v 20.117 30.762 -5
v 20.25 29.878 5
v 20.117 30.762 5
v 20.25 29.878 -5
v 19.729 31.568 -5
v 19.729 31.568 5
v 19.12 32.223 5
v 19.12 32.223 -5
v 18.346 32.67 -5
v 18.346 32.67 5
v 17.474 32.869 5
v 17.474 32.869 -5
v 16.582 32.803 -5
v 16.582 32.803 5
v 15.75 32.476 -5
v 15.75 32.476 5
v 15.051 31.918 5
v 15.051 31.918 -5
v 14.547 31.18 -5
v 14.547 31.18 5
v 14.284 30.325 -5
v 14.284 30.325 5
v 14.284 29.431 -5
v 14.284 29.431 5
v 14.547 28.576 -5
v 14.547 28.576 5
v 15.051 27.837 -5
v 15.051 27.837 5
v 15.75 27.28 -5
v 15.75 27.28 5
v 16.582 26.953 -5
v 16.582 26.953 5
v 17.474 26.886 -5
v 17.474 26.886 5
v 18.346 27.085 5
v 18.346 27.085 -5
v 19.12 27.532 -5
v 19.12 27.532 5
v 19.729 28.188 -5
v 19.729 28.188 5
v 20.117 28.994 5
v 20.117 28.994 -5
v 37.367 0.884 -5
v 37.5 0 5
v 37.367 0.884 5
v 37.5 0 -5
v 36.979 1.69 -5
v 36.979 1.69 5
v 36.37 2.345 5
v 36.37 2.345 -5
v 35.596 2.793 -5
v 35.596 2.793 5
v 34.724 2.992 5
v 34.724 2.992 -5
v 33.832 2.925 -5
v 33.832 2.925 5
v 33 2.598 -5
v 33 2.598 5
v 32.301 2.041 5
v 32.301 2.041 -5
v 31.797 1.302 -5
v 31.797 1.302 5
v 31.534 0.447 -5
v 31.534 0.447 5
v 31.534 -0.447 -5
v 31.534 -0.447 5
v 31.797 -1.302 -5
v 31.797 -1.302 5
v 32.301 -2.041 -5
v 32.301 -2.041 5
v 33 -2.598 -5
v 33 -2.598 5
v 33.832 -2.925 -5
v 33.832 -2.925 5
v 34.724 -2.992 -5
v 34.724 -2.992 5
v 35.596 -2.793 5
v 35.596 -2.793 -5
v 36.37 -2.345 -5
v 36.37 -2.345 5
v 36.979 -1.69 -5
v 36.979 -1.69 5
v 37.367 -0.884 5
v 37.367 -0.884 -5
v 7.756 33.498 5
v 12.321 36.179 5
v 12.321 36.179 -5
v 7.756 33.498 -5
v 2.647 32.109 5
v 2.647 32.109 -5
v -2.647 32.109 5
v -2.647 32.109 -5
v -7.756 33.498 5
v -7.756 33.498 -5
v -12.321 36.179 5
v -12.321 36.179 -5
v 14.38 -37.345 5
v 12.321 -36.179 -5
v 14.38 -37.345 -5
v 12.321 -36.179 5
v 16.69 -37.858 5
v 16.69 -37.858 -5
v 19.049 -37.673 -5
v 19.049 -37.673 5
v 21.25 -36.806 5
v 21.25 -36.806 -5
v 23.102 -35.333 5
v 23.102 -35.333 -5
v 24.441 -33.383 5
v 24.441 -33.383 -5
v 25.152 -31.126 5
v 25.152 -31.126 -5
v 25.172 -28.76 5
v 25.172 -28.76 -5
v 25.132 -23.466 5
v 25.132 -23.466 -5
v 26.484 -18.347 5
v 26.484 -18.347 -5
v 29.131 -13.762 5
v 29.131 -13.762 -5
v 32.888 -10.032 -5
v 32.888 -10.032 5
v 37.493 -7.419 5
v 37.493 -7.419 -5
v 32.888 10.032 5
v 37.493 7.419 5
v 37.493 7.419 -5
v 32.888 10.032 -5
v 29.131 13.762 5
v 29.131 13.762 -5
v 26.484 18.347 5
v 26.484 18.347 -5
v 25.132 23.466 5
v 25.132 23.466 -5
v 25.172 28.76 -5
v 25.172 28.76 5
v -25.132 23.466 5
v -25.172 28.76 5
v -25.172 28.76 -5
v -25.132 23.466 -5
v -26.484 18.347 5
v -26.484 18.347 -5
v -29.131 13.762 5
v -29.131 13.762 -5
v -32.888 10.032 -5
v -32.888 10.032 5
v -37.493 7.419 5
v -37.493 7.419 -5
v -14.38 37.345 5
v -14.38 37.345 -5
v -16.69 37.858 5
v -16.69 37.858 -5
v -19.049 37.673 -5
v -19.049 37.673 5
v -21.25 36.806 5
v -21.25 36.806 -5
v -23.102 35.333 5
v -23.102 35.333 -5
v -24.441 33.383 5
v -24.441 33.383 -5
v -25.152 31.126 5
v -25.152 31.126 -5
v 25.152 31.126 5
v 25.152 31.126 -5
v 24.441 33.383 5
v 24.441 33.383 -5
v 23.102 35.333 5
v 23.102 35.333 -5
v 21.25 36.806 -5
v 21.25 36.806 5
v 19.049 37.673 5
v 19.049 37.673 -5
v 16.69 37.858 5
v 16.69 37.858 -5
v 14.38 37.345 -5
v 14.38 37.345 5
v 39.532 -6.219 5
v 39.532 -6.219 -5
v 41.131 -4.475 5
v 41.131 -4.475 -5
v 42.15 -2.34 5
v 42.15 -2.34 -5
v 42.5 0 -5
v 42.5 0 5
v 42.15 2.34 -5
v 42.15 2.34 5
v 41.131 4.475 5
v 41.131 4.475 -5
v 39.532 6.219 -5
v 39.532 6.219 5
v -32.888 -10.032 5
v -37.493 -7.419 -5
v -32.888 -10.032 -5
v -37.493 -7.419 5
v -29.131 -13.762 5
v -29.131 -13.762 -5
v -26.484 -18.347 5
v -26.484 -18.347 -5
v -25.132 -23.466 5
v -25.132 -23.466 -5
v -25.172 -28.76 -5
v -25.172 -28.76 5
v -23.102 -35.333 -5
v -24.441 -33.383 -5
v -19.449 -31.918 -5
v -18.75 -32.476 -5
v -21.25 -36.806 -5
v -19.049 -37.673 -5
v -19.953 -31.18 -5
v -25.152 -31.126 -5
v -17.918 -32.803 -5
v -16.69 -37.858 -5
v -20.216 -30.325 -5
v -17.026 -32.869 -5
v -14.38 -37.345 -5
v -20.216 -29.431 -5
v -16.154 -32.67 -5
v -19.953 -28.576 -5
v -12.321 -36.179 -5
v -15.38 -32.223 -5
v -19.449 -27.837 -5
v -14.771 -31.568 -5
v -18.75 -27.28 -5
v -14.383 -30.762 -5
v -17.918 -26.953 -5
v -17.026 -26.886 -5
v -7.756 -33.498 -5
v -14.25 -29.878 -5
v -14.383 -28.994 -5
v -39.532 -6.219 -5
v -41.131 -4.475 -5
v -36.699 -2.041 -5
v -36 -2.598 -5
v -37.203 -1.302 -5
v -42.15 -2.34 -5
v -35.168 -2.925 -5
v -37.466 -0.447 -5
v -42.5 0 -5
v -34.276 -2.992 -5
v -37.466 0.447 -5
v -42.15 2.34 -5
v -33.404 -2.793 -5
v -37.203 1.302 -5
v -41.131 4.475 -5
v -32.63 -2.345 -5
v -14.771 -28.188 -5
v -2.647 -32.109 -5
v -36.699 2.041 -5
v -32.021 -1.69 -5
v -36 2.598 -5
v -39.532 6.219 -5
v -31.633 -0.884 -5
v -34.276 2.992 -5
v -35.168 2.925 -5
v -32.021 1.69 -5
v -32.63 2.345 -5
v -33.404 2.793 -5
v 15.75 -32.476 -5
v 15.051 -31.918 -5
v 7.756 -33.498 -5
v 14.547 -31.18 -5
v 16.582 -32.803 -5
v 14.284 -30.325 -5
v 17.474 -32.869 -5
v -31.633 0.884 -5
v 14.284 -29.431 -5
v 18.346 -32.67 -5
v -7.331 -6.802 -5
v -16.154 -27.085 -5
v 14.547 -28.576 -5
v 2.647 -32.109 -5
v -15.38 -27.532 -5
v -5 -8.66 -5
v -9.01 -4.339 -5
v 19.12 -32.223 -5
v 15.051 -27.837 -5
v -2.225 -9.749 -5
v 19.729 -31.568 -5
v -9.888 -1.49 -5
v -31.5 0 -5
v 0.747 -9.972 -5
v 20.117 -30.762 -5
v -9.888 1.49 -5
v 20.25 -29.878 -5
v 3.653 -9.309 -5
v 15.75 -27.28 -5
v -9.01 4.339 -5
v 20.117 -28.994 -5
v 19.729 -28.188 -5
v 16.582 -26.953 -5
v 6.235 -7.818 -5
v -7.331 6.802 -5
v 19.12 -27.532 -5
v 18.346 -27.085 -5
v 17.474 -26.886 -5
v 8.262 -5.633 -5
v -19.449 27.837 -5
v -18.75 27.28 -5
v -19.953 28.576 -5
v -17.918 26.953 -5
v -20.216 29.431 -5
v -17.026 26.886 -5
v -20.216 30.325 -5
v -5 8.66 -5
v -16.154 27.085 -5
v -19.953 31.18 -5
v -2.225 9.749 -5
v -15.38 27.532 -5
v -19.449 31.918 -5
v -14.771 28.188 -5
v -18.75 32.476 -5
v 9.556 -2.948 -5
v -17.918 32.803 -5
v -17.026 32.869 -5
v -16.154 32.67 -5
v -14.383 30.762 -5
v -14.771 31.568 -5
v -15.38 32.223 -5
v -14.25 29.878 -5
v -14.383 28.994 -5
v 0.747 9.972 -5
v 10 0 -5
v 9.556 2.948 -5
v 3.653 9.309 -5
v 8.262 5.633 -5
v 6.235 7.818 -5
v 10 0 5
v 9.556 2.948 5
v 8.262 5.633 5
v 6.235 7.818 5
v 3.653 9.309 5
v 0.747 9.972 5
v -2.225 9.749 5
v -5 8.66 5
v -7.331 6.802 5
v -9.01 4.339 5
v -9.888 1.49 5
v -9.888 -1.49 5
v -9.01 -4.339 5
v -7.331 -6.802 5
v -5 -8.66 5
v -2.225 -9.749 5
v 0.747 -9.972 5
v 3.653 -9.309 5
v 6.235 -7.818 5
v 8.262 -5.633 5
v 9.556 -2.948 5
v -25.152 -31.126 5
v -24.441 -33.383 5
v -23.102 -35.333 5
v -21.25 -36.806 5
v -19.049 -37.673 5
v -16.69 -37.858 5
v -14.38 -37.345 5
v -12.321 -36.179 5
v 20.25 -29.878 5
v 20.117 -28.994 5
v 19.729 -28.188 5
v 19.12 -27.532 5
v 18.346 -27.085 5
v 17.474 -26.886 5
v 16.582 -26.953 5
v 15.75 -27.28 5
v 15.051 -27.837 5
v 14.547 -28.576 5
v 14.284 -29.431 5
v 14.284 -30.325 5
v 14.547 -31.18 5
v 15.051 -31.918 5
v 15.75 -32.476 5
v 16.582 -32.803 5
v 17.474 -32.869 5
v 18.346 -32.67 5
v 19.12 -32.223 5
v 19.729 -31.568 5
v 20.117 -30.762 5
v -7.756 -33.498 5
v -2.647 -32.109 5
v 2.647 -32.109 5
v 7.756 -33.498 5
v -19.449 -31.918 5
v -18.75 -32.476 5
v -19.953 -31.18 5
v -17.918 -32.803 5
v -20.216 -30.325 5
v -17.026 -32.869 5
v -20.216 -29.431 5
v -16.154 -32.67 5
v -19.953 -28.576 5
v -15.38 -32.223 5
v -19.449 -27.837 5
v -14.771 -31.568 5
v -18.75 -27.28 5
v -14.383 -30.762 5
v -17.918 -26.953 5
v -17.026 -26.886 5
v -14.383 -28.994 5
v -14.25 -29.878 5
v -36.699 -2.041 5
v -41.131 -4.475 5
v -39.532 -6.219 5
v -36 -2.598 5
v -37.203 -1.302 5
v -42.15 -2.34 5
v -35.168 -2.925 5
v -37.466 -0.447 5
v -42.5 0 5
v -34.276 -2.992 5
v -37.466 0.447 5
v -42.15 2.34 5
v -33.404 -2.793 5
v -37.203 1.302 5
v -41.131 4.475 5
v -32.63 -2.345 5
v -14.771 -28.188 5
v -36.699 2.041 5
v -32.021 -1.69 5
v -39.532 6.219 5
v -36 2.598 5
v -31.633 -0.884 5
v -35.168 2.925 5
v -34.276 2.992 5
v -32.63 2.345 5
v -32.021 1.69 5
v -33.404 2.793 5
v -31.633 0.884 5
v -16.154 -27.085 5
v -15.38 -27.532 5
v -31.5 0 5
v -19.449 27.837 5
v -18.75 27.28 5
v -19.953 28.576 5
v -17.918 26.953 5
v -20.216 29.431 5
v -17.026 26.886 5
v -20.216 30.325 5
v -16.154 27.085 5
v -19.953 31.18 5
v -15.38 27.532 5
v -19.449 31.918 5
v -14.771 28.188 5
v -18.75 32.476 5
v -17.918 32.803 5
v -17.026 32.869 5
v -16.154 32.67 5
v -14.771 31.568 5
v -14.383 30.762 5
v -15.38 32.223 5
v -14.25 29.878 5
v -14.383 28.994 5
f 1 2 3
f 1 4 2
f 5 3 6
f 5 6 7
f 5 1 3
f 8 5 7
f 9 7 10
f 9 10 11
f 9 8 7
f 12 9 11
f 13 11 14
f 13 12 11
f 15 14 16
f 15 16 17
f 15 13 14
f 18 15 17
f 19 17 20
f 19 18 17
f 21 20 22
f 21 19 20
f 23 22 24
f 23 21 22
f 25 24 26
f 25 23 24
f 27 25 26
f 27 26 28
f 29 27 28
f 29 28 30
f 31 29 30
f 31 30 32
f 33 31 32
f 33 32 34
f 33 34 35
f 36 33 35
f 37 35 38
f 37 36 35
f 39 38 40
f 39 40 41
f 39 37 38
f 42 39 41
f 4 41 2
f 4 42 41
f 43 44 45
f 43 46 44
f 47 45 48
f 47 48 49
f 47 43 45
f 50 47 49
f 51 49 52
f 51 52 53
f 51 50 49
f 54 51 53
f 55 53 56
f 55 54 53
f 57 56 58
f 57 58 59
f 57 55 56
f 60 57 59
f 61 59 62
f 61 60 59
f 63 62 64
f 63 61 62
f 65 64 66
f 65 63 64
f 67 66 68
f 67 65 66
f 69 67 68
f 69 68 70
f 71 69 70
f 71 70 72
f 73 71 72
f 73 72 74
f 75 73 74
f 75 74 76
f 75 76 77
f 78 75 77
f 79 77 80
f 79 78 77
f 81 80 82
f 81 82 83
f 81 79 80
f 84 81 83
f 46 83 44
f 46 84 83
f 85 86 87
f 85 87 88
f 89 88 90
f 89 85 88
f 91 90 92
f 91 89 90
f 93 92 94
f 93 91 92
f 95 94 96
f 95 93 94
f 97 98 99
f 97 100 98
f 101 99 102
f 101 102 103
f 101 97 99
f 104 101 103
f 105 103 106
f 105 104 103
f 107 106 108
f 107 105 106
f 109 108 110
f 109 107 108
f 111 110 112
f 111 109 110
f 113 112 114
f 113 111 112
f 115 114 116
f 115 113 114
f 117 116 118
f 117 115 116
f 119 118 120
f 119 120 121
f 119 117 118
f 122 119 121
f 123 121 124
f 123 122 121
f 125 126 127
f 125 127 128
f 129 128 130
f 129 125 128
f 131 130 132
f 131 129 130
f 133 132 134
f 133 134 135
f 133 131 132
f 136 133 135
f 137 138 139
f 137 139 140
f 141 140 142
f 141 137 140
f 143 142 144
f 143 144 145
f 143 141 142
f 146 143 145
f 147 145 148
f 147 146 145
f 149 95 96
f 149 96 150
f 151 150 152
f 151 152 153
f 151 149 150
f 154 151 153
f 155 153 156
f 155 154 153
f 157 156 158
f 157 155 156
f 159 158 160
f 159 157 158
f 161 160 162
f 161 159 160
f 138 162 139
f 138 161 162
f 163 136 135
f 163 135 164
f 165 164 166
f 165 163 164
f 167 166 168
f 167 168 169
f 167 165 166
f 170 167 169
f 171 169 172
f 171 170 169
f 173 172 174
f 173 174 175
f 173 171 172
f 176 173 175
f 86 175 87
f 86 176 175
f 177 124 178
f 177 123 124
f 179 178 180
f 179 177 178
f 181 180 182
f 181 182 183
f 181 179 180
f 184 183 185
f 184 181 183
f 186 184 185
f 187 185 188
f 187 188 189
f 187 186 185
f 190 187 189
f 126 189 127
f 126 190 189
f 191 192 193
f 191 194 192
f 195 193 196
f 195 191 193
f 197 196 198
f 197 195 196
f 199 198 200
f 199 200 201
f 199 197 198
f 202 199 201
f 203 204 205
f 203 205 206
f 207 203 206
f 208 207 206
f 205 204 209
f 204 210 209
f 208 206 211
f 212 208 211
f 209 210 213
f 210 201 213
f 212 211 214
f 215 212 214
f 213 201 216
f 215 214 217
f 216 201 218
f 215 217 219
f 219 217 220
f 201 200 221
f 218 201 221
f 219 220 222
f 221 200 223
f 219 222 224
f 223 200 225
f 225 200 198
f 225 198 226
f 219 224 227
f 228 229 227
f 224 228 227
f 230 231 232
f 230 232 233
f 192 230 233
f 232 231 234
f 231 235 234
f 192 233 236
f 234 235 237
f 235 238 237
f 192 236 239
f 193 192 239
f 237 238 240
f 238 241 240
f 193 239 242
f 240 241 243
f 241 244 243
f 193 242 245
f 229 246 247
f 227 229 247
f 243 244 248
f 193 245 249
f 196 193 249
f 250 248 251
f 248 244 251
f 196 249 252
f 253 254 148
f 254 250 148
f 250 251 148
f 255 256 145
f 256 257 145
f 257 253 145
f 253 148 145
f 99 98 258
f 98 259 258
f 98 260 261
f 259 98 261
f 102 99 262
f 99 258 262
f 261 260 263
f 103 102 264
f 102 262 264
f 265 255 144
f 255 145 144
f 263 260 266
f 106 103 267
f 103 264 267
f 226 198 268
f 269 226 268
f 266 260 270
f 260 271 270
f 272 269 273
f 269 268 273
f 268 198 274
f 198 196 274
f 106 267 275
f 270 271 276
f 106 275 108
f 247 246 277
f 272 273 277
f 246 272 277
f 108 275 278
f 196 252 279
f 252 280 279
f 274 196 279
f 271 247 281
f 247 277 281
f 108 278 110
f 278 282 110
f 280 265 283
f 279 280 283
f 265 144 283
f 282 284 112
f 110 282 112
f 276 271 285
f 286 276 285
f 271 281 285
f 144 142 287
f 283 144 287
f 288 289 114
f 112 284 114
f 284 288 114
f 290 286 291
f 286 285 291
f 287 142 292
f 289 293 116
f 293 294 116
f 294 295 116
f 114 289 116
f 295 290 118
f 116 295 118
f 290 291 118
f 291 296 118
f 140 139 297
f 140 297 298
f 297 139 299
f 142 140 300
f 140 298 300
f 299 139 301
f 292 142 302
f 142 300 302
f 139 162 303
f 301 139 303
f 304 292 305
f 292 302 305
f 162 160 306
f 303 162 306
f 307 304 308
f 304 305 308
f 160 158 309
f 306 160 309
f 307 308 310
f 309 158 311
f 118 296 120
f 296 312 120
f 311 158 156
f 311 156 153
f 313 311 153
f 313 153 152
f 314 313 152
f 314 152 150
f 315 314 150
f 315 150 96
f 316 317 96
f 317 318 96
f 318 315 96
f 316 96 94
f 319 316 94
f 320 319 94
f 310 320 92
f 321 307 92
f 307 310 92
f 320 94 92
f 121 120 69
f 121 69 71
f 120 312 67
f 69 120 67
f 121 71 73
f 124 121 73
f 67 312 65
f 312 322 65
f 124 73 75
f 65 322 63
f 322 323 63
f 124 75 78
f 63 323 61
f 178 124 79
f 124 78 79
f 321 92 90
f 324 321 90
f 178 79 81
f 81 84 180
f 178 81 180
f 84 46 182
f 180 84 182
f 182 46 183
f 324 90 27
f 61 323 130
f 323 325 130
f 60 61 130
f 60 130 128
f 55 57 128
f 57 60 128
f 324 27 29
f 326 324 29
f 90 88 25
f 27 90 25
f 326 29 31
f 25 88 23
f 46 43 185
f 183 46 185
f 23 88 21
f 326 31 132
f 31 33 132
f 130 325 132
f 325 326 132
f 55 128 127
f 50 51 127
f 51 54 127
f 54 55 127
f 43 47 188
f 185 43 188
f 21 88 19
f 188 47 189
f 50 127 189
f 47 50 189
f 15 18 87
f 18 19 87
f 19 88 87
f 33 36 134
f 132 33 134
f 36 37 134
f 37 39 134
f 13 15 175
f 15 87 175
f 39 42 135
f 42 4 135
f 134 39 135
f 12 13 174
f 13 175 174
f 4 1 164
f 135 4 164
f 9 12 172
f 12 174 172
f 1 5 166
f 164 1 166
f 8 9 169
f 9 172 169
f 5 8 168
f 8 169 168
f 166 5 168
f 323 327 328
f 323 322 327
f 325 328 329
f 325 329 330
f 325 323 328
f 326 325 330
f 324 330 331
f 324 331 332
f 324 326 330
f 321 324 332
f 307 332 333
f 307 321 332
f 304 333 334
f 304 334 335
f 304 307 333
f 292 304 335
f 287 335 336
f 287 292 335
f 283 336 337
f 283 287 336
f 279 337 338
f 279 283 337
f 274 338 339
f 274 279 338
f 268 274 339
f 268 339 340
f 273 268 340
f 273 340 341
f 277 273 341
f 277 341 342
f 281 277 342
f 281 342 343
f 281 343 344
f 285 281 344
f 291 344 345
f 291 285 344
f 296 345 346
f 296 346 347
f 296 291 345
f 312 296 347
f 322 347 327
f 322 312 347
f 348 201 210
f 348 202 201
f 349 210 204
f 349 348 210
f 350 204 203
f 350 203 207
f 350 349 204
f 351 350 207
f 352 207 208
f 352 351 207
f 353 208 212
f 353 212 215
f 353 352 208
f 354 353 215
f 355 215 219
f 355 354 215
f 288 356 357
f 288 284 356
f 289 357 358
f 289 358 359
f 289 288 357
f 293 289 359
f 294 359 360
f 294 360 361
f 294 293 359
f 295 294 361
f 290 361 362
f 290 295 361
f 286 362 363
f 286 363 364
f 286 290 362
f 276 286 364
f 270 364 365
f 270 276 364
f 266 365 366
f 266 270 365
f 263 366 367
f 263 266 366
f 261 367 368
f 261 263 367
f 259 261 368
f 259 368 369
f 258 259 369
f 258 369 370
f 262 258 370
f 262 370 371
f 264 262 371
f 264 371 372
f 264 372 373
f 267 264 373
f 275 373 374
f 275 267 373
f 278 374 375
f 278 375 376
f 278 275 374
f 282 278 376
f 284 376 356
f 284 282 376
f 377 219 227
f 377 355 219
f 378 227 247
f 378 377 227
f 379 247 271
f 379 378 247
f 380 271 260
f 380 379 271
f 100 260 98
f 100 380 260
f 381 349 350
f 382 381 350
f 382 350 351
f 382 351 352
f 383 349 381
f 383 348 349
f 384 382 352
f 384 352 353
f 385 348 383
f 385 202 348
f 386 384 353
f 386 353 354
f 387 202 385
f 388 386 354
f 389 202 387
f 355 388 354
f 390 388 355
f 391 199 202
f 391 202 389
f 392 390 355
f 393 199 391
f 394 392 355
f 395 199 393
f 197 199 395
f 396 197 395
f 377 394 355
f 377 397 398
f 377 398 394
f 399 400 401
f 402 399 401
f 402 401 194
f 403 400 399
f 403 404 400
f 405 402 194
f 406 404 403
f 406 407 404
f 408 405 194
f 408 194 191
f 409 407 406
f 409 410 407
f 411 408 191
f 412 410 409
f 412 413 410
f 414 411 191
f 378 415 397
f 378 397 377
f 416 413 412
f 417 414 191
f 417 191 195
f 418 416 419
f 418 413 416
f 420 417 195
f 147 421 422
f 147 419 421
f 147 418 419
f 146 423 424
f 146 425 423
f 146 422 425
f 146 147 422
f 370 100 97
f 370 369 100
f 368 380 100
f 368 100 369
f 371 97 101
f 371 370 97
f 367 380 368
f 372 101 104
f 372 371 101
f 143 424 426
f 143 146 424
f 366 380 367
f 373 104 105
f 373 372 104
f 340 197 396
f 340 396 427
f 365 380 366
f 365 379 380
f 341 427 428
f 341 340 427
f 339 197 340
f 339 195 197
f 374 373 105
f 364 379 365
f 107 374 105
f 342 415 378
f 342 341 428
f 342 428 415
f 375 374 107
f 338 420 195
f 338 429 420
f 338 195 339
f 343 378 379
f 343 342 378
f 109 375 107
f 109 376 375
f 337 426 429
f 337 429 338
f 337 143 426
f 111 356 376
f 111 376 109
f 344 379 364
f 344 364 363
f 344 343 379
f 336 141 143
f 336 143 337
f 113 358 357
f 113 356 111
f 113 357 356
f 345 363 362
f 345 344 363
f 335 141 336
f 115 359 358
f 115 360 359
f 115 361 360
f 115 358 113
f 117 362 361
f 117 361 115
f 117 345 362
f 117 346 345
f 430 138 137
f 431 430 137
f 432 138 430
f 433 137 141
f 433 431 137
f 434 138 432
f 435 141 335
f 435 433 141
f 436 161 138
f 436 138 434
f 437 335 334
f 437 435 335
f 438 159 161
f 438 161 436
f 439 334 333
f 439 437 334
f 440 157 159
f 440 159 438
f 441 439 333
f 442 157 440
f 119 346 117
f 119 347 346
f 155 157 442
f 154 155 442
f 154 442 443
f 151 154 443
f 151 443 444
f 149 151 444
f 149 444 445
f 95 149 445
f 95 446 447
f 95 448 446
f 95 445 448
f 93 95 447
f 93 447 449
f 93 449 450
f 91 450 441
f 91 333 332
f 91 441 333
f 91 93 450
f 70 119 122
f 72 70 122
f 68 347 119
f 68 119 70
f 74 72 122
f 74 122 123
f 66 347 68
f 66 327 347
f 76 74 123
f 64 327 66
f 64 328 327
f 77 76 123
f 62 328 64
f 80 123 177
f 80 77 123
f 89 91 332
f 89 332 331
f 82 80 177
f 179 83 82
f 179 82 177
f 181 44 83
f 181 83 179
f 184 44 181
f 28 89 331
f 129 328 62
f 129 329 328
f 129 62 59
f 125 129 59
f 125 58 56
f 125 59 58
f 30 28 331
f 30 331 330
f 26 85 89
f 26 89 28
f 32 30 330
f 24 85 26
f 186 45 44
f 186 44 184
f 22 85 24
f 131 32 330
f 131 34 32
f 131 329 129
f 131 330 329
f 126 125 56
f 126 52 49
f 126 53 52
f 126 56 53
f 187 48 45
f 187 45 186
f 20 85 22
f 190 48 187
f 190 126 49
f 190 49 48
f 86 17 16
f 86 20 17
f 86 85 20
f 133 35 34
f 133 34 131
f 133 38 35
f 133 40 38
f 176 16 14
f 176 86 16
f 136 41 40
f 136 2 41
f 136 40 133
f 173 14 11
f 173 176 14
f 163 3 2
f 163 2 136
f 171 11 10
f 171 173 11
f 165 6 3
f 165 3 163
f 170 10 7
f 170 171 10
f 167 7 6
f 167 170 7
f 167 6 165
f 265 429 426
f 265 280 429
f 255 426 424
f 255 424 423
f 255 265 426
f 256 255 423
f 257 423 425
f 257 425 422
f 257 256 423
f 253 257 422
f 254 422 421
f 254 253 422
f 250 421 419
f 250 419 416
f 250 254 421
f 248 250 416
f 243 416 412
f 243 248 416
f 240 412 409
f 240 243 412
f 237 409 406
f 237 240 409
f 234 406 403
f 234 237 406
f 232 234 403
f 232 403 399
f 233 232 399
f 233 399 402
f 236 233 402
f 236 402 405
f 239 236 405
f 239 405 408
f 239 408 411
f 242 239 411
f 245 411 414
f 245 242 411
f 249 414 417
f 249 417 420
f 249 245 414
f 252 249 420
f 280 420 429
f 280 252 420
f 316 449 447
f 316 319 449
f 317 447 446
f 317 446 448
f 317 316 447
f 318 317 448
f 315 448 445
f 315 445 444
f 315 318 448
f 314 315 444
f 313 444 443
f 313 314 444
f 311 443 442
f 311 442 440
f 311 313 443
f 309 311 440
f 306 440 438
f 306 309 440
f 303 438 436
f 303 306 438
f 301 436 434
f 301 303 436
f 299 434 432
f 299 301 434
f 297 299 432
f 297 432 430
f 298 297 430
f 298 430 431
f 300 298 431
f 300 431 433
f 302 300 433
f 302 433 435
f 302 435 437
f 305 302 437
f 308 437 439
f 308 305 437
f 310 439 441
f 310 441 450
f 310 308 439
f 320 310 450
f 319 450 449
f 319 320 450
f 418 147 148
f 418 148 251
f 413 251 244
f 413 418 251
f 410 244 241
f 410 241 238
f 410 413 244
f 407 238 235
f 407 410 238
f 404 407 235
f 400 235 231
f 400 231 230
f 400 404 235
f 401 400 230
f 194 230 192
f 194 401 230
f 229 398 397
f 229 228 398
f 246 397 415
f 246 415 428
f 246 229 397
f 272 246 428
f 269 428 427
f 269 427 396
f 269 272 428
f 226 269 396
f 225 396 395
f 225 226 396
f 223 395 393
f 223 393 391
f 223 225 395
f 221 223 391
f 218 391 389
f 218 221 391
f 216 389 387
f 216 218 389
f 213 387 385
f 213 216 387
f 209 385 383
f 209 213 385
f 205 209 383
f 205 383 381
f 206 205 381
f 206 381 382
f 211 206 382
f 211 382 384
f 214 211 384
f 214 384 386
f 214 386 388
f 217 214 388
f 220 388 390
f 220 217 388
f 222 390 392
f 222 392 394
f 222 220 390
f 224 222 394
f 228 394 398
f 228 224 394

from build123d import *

# Parameters (mm, degrees)
SKETCH1_R           = 10
SKETCH1_R_2         = 3
BOSS_EXTRUDE1_DEPTH = 5


with BuildPart() as part:
    # Sketch1 → Boss-Extrude1 (new, symmetric)
    with BuildSketch(Plane.XY):
        with BuildLine():
            ThreePointArc((37.492992706, -7.419029226), (42.5, 0), (37.492992706, 7.419029226))
            ThreePointArc((37.492992706, 7.419029226), (27.654966395, 15.966602293), (25.171564134, 28.760369534))
            ThreePointArc((25.171564134, 28.760369534), (21.25, 36.806079661), (12.321428571, 36.17939876))
            ThreePointArc((12.321428571, 36.17939876), (0, 31.933204585), (-12.321428571, 36.17939876))
            ThreePointArc((-12.321428571, 36.17939876), (-21.25, 36.806079661), (-25.171564134, 28.760369534))
            ThreePointArc((-25.171564134, 28.760369534), (-27.654966395, 15.966602293), (-37.492992706, 7.419029226))
            ThreePointArc((-37.492992706, 7.419029226), (-42.5, 0), (-37.492992706, -7.419029226))
            ThreePointArc((-37.492992706, -7.419029226), (-27.654966395, -15.966602293), (-25.171564134, -28.760369534))
            ThreePointArc((-25.171564134, -28.760369534), (-21.25, -36.806079661), (-12.321428571, -36.17939876))
            ThreePointArc((-12.321428571, -36.17939876), (0, -31.933204585), (12.321428571, -36.17939876))
            ThreePointArc((12.321428571, -36.17939876), (21.25, -36.806079661), (25.171564134, -28.760369534))
            ThreePointArc((25.171564134, -28.760369534), (27.654966395, -15.966602293), (37.492992706, -7.419029226))
        make_face()
        Circle(SKETCH1_R, mode=Mode.SUBTRACT)
        with Locations((34.5, 0)):
            Circle(SKETCH1_R_2, mode=Mode.SUBTRACT)
        with Locations((17.25, -29.877876431)):
            Circle(SKETCH1_R_2, mode=Mode.SUBTRACT)
        with Locations((-17.25, -29.877876431)):
            Circle(SKETCH1_R_2, mode=Mode.SUBTRACT)
        with Locations((-34.5, 0)):
            Circle(SKETCH1_R_2, mode=Mode.SUBTRACT)
        with Locations((-17.25, 29.877876431)):
            Circle(SKETCH1_R_2, mode=Mode.SUBTRACT)
        with Locations((17.25, 29.877876431)):
            Circle(SKETCH1_R_2, mode=Mode.SUBTRACT)
    extrude(amount=BOSS_EXTRUDE1_DEPTH, both=True)


solid = part.part
